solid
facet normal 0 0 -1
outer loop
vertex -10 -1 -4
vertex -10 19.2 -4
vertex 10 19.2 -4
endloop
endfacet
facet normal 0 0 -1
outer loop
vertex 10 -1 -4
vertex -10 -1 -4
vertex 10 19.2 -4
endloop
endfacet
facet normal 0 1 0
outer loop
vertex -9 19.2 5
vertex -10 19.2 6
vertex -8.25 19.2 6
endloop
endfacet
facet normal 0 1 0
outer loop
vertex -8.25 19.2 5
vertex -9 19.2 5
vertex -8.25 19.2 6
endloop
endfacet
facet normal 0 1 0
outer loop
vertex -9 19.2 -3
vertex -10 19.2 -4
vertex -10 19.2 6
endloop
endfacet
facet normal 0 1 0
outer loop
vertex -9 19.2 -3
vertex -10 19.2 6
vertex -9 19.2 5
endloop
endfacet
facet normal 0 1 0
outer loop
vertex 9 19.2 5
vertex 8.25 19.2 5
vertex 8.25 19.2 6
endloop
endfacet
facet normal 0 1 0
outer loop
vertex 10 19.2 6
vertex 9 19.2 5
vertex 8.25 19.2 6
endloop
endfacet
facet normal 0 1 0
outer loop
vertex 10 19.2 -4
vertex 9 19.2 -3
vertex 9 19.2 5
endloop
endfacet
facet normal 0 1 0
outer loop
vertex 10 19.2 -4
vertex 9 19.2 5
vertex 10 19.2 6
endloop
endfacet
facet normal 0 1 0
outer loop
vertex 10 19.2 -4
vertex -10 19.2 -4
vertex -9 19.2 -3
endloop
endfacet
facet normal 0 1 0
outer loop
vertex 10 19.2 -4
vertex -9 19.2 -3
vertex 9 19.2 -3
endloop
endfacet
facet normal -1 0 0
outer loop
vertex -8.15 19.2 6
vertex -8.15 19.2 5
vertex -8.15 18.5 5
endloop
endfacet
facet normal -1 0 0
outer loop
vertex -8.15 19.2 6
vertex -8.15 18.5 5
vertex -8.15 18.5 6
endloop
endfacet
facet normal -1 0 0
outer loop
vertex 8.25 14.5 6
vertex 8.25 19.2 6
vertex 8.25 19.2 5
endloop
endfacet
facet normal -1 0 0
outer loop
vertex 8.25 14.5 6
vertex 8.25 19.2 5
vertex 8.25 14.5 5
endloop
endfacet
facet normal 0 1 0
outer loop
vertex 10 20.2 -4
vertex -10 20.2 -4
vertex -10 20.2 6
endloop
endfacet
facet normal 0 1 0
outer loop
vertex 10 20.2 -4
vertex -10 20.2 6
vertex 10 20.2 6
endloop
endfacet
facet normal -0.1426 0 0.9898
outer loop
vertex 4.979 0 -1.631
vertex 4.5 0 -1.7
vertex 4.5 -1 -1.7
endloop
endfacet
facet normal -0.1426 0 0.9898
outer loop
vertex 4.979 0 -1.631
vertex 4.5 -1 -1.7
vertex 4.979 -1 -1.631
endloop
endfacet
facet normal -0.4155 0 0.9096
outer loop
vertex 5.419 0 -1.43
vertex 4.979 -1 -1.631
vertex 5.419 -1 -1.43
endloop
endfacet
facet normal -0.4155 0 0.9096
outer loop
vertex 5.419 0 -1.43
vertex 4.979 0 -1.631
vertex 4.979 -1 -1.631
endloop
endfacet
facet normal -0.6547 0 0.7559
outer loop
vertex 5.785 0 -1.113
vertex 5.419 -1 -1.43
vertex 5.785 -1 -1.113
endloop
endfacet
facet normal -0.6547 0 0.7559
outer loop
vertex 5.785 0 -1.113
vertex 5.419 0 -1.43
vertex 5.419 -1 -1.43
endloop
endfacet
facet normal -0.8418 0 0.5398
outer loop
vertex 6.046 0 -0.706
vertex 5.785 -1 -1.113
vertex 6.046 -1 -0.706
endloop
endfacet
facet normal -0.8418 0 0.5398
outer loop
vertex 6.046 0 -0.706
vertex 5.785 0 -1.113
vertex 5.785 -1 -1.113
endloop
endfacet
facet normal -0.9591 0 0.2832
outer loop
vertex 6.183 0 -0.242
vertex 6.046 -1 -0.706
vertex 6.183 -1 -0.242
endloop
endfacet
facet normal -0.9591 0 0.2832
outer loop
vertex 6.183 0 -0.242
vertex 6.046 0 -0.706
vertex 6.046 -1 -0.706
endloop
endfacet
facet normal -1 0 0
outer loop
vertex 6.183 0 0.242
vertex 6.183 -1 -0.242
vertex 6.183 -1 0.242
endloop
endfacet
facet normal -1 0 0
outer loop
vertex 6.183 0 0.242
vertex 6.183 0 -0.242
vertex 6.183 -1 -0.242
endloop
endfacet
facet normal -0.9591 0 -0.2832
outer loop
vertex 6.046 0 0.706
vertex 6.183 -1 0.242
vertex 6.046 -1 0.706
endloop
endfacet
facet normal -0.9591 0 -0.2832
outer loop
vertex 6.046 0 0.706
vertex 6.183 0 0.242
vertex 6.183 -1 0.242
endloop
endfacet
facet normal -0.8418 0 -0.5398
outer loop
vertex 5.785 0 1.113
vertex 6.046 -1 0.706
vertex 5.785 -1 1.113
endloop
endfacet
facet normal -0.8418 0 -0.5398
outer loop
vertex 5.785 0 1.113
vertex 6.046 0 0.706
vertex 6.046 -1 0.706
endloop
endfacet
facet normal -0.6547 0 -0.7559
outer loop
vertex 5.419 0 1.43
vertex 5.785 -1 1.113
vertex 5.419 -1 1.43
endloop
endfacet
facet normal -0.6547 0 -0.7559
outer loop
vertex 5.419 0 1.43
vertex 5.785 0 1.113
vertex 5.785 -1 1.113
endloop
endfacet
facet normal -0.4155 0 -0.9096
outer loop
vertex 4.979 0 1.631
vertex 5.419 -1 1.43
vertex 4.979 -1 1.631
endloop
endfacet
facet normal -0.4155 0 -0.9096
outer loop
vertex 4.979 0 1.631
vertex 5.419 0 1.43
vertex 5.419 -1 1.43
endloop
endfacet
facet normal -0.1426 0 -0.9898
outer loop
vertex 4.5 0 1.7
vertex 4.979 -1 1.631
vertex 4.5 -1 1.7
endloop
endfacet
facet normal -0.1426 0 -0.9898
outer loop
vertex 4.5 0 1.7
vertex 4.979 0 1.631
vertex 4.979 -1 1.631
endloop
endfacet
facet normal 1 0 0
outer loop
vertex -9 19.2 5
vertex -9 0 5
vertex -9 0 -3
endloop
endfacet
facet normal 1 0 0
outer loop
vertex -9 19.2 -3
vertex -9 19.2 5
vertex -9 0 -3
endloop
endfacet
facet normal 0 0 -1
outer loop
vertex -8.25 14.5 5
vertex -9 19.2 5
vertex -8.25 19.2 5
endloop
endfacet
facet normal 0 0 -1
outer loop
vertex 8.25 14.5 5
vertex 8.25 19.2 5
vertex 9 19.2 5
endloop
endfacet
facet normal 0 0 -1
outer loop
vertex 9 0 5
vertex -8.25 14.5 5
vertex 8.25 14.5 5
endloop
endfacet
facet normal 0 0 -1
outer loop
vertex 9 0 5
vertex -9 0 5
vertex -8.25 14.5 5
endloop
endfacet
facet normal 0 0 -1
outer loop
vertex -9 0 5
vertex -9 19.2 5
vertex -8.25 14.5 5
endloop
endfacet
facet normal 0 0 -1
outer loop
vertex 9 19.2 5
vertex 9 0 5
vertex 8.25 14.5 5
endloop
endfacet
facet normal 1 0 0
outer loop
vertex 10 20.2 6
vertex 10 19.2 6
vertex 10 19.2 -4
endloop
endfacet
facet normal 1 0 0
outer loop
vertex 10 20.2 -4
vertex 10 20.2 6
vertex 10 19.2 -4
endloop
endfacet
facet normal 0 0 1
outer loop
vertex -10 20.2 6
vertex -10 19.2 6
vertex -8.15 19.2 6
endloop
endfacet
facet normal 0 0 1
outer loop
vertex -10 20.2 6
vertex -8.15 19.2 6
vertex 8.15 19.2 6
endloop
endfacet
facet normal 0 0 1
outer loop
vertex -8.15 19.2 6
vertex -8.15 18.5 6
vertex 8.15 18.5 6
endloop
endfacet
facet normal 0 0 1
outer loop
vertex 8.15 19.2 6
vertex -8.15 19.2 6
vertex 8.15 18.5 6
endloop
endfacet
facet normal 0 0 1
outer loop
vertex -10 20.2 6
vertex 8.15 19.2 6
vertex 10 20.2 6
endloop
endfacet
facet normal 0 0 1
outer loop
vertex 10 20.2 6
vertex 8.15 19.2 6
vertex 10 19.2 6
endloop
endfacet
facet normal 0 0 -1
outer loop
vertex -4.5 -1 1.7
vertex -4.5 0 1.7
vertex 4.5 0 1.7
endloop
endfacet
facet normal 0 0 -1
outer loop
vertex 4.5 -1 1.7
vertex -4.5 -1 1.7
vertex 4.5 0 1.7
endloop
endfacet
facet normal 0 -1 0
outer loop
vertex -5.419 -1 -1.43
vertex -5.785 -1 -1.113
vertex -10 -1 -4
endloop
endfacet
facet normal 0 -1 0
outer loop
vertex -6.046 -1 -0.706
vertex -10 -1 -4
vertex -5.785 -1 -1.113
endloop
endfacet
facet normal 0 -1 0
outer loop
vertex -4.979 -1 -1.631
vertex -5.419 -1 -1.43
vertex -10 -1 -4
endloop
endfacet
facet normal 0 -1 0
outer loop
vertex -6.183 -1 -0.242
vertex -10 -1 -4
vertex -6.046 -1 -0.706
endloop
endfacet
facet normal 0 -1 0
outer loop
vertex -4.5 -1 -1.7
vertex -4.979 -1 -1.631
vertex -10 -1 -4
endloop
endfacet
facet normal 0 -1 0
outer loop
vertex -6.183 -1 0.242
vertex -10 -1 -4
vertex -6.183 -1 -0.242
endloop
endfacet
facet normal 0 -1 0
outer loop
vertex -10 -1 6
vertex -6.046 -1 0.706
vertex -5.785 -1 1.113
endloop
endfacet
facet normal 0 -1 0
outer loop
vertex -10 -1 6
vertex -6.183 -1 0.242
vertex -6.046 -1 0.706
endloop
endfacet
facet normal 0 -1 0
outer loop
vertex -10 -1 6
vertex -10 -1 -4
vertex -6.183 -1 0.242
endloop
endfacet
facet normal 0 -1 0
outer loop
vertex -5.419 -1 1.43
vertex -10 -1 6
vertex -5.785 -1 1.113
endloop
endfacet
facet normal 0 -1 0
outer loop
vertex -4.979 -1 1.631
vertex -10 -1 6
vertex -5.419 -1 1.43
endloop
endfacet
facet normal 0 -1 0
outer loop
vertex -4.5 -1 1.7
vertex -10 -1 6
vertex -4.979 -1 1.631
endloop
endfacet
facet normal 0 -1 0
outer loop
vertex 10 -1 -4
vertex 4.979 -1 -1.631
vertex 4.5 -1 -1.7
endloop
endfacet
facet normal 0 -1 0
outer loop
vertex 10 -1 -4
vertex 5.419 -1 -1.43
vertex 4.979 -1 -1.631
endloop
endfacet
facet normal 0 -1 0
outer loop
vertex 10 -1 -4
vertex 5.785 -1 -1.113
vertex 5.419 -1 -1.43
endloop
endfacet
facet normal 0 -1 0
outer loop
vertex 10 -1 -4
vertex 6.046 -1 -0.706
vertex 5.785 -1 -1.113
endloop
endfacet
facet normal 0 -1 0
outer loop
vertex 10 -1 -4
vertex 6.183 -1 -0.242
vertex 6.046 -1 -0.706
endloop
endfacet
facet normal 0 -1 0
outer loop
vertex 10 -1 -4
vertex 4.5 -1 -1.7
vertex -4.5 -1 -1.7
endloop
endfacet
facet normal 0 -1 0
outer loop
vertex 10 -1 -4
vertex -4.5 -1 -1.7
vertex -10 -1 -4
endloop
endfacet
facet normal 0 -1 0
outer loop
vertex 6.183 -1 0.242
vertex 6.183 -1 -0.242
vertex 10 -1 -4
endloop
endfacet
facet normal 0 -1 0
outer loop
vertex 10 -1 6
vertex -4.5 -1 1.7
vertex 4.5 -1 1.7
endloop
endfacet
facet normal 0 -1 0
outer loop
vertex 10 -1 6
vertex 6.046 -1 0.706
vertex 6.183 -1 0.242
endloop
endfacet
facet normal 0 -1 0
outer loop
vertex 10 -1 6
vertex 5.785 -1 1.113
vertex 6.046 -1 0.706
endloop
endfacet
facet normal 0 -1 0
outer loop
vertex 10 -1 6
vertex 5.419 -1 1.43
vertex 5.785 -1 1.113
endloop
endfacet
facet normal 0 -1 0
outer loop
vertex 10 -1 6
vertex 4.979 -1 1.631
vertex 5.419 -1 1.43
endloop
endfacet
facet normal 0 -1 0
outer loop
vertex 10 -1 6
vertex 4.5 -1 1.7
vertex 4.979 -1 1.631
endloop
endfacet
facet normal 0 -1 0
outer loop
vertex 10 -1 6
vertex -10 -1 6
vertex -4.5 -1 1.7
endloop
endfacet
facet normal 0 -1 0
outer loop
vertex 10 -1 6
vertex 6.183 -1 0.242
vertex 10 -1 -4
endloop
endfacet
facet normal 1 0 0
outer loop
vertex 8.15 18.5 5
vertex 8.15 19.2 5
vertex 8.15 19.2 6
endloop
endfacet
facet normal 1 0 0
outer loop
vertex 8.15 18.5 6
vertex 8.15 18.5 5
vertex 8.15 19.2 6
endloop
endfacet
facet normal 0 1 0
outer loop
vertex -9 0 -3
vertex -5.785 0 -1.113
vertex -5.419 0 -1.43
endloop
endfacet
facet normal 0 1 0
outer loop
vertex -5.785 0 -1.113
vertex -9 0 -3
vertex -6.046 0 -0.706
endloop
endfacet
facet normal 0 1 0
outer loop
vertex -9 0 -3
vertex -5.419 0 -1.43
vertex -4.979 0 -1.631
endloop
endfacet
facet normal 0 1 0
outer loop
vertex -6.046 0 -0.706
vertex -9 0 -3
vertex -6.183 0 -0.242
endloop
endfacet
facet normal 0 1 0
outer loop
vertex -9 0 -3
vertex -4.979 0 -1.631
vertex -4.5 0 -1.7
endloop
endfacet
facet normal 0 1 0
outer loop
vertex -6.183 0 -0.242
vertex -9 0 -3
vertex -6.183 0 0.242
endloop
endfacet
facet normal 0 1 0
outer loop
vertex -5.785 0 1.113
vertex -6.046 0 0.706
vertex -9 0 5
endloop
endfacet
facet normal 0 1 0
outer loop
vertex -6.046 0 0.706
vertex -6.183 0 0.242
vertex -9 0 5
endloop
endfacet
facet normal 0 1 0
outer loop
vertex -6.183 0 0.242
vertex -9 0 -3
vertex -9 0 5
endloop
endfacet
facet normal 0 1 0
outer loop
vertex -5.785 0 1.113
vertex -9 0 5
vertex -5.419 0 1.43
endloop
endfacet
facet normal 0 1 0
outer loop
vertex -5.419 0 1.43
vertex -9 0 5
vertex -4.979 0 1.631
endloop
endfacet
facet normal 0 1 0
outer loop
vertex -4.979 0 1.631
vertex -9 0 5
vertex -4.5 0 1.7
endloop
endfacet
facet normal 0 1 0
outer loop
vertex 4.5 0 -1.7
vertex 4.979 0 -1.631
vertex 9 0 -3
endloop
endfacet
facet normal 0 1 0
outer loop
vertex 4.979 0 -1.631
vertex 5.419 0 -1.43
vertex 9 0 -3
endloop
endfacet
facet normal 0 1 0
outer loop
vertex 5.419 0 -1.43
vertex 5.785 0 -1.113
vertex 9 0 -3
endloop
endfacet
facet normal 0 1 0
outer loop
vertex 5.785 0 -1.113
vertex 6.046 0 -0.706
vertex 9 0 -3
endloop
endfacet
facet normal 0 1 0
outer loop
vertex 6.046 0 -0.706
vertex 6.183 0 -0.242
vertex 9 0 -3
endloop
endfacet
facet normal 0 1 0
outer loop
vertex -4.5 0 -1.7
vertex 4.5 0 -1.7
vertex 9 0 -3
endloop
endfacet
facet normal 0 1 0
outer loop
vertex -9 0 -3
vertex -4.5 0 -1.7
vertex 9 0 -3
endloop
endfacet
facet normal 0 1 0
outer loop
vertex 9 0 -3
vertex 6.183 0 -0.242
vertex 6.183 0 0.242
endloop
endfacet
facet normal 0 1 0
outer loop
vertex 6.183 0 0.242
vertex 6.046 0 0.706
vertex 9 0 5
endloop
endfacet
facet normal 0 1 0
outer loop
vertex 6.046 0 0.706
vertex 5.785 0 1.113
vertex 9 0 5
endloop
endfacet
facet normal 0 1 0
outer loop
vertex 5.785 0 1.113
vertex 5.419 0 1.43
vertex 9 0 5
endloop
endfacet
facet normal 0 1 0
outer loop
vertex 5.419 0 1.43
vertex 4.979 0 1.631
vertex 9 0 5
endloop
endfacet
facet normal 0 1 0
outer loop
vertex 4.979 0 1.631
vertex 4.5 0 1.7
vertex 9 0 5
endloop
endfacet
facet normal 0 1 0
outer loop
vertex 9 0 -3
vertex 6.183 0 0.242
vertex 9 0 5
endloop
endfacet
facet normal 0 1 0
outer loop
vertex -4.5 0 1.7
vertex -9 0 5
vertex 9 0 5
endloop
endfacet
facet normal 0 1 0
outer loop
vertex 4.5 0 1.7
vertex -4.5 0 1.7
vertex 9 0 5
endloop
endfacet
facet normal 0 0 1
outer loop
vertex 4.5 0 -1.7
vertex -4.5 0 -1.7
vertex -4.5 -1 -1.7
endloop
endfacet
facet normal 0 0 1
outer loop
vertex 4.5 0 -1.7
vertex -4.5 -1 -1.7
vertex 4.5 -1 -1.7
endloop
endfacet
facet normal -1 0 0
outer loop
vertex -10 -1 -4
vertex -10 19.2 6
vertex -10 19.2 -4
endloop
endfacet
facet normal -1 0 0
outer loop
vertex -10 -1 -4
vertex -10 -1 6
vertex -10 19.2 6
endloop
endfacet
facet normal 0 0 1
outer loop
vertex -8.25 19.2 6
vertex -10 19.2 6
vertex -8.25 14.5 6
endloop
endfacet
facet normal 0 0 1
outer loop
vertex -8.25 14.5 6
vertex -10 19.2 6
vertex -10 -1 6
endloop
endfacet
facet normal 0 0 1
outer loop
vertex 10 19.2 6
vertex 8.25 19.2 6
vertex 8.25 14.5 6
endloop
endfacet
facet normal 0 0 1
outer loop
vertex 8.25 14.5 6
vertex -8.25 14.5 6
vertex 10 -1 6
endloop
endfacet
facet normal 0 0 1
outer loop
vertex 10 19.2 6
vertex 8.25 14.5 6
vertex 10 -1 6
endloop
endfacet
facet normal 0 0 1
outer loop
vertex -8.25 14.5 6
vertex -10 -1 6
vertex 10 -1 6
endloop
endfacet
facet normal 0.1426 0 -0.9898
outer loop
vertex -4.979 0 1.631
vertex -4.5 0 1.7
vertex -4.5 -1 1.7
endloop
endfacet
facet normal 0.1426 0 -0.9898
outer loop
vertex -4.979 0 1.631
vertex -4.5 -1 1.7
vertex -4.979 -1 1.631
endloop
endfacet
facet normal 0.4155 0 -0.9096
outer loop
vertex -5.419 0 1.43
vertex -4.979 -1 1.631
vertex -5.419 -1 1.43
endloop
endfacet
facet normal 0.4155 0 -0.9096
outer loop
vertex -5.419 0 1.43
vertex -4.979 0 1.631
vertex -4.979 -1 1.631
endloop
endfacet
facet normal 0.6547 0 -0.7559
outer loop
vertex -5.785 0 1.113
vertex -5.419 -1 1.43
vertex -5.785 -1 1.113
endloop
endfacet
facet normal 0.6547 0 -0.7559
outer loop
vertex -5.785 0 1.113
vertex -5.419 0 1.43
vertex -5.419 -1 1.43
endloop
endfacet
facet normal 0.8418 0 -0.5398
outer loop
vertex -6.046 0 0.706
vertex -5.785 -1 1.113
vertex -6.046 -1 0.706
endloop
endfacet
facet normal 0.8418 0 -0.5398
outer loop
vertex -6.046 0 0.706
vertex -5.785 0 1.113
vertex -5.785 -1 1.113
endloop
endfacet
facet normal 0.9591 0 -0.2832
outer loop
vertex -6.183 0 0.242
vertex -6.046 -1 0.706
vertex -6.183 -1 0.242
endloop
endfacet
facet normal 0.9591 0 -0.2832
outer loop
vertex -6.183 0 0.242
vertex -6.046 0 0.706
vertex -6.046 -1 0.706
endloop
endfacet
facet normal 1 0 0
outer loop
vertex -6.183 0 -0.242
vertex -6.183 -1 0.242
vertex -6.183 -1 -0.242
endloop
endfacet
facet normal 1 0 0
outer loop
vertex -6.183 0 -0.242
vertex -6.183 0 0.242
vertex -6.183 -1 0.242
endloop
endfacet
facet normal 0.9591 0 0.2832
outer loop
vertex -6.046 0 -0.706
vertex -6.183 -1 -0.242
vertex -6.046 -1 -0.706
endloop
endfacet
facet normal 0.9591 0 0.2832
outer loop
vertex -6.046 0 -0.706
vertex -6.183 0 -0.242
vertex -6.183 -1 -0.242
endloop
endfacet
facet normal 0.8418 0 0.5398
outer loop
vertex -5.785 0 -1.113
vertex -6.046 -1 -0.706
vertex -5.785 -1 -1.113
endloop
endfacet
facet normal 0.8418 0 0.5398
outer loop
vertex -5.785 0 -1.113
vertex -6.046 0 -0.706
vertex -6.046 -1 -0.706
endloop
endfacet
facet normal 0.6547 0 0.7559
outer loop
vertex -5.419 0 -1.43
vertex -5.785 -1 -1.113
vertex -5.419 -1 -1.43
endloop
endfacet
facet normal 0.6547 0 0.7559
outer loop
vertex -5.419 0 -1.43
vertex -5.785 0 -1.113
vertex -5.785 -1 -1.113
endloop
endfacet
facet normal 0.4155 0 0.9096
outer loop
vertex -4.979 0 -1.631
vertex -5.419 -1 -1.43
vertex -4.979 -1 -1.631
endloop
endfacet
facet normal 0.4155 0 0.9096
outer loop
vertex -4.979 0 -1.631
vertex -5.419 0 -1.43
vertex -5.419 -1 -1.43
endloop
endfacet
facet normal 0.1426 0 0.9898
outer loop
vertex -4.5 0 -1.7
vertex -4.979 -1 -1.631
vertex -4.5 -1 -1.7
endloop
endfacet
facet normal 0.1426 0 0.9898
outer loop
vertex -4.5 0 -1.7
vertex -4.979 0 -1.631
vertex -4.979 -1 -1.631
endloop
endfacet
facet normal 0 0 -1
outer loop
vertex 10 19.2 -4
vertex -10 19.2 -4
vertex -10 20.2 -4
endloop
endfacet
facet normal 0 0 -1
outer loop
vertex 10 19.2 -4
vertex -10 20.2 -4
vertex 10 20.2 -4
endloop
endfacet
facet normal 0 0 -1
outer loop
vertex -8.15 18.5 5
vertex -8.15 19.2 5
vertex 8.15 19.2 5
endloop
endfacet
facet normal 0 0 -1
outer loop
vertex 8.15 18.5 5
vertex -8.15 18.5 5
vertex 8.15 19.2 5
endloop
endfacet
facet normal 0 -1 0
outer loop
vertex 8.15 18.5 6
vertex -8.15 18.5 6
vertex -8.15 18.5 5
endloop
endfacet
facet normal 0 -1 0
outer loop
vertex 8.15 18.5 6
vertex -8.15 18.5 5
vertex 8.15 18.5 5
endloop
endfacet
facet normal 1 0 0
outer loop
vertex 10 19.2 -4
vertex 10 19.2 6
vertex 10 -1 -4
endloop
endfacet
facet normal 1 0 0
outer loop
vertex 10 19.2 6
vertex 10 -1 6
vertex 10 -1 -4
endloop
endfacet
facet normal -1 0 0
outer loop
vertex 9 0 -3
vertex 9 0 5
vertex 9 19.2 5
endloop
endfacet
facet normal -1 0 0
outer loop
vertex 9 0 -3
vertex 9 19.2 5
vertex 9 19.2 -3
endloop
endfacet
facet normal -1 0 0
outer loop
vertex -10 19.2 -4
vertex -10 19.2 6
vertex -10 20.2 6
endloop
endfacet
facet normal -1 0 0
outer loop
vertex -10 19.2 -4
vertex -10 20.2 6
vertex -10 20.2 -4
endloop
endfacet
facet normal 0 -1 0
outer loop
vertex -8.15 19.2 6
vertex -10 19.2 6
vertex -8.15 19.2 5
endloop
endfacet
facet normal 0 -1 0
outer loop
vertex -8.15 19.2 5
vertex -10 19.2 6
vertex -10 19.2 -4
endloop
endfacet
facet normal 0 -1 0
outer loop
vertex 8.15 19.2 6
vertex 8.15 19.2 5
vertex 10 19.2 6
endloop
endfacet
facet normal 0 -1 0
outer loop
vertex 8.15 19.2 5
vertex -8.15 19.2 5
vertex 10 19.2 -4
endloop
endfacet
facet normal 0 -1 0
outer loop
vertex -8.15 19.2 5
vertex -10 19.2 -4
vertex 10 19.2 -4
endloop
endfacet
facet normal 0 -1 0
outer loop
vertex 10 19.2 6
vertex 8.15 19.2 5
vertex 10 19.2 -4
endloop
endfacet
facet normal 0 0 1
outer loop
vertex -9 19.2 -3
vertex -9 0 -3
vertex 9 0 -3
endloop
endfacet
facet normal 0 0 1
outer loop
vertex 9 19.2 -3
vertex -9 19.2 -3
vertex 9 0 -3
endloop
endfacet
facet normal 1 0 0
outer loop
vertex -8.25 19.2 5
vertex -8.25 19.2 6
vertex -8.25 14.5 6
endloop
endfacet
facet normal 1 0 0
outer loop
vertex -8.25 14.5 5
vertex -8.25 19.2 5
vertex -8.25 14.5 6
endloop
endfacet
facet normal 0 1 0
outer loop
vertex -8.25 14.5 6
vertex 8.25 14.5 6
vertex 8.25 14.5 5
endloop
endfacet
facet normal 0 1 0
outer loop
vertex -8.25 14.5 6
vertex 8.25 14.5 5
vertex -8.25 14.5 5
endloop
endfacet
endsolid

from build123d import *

# Parameters (mm, degrees)
SKETCH_W      = 20
SKETCH_H      = 10
PAD_DEPTH     = 1
SKETCH001_W   = 20
SKETCH001_H   = 10
SKETCH001_W_2 = 18
SKETCH001_H_2 = 8
PAD001_DEPTH  = 19.2
SKETCH002_W   = 16.5
SKETCH002_H   = 4.7
POCKET_DEPTH  = 1
SKETCH003_W   = 20
SKETCH003_H   = 10
PAD002_DEPTH  = 1
SKETCH004_W   = 16.3
SKETCH004_H   = 1
PAD003_DEPTH  = 0.7


with BuildPart() as main:
    # Sketch → Pad (new body)
    with BuildSketch(Plane.XZ):
        with Locations((0, 1)):
            Rectangle(SKETCH_W, SKETCH_H)
        with BuildLine():
            ThreePointArc((-4.5, 1.7), (-6.2, 0), (-4.5, -1.7))
            Line((-4.5, -1.7), (4.5, -1.7))
            ThreePointArc((4.5, -1.7), (6.2, 0), (4.5, 1.7))
            Line((-4.5, 1.7), (4.5, 1.7))
        make_face(mode=Mode.SUBTRACT)
    extrude(amount=PAD_DEPTH)

    # Sketch001 (on Face9 of Pad) → Pad001 (join)
    with BuildSketch(Plane(origin=(0, 0, 0), x_dir=(1, 0, 0), z_dir=(0, 1, 0))):
        with Locations((0, -1)):
            Rectangle(SKETCH001_W, SKETCH001_H)
        with Locations((0, -1)):
            Rectangle(SKETCH001_W_2, SKETCH001_H_2, mode=Mode.SUBTRACT)
    extrude(amount=PAD001_DEPTH)

    # Sketch002 (on Face4 of Pad001) → Pocket (cut)
    with BuildSketch(Plane(origin=(0, 0, 6), x_dir=(-1, 0, 0), z_dir=(0, 0, 1))):
        with Locations((0, -16.85)):
            Rectangle(SKETCH002_W, SKETCH002_H)
    extrude(amount=-POCKET_DEPTH, mode=Mode.SUBTRACT)


with BuildPart() as lid:
    # Sketch003 (on Face1 of ReferencePocket) → Pad002 (new body)
    with BuildSketch(Plane(origin=(0, 19.2, 0), x_dir=(1, 0, 0), z_dir=(0, 1, 0))):
        with Locations((0, -1)):
            Rectangle(SKETCH003_W, SKETCH003_H)
    extrude(amount=PAD002_DEPTH)

    # Sketch004 (on Face5 of Pad002) → Pad003 (join)
    with BuildSketch(Plane.XZ.offset(-19.2)):
        with Locations((0, 5.5)):
            Rectangle(SKETCH004_W, SKETCH004_H)
    extrude(amount=PAD003_DEPTH)


solid = Compound([main.part, lid.part])
